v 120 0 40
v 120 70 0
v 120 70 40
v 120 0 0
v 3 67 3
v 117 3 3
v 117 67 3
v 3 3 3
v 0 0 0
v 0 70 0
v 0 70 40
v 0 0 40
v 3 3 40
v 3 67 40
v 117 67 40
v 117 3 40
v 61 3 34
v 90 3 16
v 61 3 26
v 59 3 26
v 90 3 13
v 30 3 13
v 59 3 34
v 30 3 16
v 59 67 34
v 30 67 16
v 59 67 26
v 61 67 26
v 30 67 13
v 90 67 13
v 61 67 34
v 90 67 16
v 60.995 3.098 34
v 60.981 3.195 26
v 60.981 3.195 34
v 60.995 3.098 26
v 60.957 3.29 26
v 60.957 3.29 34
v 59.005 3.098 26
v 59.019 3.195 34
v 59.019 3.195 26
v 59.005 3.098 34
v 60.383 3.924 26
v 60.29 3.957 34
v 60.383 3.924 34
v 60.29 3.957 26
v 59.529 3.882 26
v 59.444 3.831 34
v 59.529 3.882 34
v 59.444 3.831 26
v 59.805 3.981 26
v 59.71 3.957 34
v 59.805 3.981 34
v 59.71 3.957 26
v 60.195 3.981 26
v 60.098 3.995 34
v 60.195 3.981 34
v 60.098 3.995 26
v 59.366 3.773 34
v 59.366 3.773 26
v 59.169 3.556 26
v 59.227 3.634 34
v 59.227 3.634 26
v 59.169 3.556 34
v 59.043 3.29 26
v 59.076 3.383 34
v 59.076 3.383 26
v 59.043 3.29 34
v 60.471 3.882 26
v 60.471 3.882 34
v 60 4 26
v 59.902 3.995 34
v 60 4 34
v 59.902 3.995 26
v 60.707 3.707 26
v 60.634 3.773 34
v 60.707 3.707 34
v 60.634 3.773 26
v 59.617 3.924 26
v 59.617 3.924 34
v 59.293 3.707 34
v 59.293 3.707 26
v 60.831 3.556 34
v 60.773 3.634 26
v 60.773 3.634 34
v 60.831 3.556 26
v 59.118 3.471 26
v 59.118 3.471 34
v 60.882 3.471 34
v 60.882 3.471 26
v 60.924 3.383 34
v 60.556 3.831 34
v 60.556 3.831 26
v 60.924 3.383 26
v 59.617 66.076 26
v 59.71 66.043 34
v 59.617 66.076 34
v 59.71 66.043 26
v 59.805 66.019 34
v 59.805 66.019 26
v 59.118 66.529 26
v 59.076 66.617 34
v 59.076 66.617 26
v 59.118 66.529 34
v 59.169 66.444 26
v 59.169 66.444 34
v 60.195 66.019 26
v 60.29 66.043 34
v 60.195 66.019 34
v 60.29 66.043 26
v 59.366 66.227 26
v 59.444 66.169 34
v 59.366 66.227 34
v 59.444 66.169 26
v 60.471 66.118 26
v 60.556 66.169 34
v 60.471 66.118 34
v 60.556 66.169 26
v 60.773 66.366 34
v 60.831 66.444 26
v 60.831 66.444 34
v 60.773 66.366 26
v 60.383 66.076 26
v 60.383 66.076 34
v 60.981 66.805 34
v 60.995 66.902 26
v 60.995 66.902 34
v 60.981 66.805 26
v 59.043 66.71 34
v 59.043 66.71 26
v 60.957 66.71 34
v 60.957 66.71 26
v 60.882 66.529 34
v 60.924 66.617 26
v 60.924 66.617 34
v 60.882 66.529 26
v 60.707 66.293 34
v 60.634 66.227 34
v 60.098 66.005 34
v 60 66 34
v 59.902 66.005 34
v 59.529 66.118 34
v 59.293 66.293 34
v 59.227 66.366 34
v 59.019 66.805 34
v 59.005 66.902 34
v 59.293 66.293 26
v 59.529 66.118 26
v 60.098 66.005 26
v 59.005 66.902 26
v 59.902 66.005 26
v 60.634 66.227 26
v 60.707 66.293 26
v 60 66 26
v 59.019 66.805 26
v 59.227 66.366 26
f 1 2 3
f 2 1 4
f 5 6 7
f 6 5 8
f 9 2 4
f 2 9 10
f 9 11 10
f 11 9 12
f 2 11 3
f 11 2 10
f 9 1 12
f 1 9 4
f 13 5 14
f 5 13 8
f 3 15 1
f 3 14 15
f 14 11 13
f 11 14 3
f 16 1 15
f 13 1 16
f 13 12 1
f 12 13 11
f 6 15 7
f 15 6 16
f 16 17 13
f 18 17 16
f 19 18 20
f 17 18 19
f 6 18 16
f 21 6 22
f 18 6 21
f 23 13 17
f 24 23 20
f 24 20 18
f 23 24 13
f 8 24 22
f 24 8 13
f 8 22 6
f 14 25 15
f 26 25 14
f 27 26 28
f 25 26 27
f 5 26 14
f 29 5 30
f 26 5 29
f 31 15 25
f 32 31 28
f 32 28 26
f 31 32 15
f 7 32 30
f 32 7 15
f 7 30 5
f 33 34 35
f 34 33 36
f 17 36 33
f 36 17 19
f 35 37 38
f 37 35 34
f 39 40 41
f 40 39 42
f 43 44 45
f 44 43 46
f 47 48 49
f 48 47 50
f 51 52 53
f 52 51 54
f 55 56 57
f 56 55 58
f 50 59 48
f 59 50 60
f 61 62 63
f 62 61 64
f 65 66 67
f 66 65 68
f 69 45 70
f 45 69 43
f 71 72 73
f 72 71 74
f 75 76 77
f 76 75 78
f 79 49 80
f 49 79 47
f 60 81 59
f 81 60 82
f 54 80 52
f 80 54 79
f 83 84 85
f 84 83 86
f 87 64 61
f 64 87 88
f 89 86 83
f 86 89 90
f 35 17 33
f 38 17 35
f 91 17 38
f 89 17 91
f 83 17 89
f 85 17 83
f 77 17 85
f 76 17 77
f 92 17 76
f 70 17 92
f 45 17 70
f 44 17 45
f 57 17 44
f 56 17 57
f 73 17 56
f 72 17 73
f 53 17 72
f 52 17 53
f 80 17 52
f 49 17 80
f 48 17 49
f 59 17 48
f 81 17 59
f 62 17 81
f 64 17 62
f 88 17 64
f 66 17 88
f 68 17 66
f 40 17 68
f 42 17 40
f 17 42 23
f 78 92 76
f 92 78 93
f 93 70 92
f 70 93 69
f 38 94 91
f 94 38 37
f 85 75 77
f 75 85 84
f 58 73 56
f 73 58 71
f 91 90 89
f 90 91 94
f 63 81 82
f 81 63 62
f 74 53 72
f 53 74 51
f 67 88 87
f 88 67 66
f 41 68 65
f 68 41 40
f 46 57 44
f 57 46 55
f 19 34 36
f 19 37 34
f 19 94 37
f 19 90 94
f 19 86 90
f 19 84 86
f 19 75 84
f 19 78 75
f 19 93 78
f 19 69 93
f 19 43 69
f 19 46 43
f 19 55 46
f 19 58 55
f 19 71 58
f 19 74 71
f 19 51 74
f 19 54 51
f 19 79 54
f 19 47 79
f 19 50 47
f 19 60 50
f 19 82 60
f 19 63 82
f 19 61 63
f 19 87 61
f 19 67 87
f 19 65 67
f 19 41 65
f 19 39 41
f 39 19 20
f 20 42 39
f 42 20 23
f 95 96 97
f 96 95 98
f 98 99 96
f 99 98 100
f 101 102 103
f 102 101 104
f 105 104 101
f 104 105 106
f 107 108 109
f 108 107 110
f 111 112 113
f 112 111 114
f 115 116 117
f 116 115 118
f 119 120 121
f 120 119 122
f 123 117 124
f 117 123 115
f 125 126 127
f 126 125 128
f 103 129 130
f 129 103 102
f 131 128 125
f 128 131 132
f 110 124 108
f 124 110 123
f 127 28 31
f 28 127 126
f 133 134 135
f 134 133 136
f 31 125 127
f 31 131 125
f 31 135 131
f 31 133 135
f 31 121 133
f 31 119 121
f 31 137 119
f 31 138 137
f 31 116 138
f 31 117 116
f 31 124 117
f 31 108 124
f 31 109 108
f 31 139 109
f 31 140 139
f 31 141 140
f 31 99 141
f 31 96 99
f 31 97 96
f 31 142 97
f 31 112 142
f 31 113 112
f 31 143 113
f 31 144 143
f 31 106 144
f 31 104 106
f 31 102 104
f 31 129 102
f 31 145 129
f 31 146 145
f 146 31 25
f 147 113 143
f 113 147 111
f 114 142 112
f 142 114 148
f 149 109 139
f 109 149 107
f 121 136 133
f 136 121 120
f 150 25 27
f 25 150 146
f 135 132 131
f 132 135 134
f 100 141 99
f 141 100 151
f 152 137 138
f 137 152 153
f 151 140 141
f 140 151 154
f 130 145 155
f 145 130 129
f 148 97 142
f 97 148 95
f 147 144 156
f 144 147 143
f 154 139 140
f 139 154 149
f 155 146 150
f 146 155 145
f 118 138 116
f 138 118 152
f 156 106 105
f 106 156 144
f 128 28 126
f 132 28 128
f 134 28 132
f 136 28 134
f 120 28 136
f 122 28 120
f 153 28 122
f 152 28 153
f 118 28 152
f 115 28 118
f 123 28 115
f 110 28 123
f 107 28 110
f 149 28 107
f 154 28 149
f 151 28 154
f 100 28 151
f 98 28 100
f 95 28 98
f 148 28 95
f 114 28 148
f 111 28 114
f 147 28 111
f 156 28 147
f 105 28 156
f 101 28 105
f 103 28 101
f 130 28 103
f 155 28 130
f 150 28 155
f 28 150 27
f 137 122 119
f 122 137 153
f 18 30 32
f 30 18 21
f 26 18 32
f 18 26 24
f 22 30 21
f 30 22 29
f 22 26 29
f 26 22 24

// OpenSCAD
// Buffer Tank for Mini Horizontal Gel-Electrophoresis Box
// Units: mm

// --- Dimensions ---
tank_outer_x = 120;  // Outer length
tank_outer_y = 70;   // Outer width
tank_outer_z = 40;   // Outer height
wall_thickness = 3;  // Thickness of walls and floor
hole_diameter = 2;   // Diameter for electrode wires
hole_z_pos = 30;     // Height of electrode holes
platform_x_len = 60; // Length of the raised platform
platform_height = 10;// Height of the raised platform
inner_floor_z = 3;   // Height of the inner floor (wall thickness)

// Derived Dimensions
tank_inner_x = tank_outer_x - (2 * wall_thickness);
tank_inner_y = tank_outer_y - (2 * wall_thickness);
tank_inner_z = tank_outer_z - wall_thickness; // Top is open

platform_x_offset = (tank_outer_x - platform_x_len) / 2;
platform_z_pos = inner_floor_z + platform_height;

// --- Rendering ---
$fn = 64;

// 1. Base and Walls (Outer Shell)
union() {
    // Floor
    translate([0, 0, 0])
    cube([tank_outer_x, tank_outer_y, wall_thickness], center=false);
    
    // Side Walls (Left, Right, Front, Back)
    // Left Wall
    translate([0, 0, wall_thickness])
    cube([wall_thickness, tank_outer_y, tank_inner_z], center=false);
    
    // Right Wall
    translate([tank_outer_x - wall_thickness, 0, wall_thickness])
    cube([wall_thickness, tank_outer_y, tank_inner_z], center=false);
    
    // Front Wall
    translate([wall_thickness, 0, wall_thickness])
    cube([tank_inner_x, wall_thickness, tank_inner_z], center=false);
    
    // Back Wall
    translate([wall_thickness, tank_outer_y - wall_thickness, wall_thickness])
    cube([tank_inner_x, wall_thickness, tank_inner_z], center=false);
}

// 2. Inner Void (The Tank Cavity)
// We subtract the inner space from the outer shell.
difference() {
    union() {
        // Floor
        translate([wall_thickness, wall_thickness, 0])
        cube([tank_inner_x, tank_inner_y, wall_thickness], center=false);
        
        // Side Walls (Left, Right, Front, Back)
        // Left Wall
        translate([wall_thickness, wall_thickness, wall_thickness])
        cube([wall_thickness, tank_inner_y, tank_inner_z], center=false);
        
        // Right Wall
        translate([tank_outer_x - (2 * wall_thickness), wall_thickness, wall_thickness])
        cube([wall_thickness, tank_inner_y, tank_inner_z], center=false);
        
        // Front Wall
        translate([wall_thickness, wall_thickness, wall_thickness])
        cube([tank_inner_x, wall_thickness, tank_inner_z], center=false);
        
        // Back Wall
        translate([wall_thickness, tank_outer_y - (2 * wall_thickness), wall_thickness])
        cube([tank_inner_x, wall_thickness, tank_inner_z], center=false);
    }
    
    // Inner Void
    translate([wall_thickness, wall_thickness, wall_thickness])
    cube([tank_inner_x, tank_inner_y, tank_inner_z], center=false);
}

// 3. Raised Platform
// The platform is a solid block that sits inside the void.
translate([platform_x_offset, wall_thickness, platform_z_pos])
cube([platform_x_len, tank_inner_y, wall_thickness], center=false);

// 4. Electrode Holes
// We drill holes through the front and back walls.
// We extend the drill bit slightly past the face to ensure clean cuts.
drill_depth = 5; // How far the drill bit extends past the wall face

// Front Wall Holes
for (i = [-1, 1]) {
    translate([wall_thickness + (tank_inner_x / 2), wall_thickness, hole_z_pos])
    cylinder(h = wall_thickness + drill_depth, d = hole_diameter, center = true);
}

// Back Wall Holes
for (i = [-1, 1]) {
    translate([wall_thickness + (tank_inner_x / 2), tank_outer_y - wall_thickness, hole_z_pos])
    cylinder(h = wall_thickness + drill_depth, d = hole_diameter, center = true);
}
